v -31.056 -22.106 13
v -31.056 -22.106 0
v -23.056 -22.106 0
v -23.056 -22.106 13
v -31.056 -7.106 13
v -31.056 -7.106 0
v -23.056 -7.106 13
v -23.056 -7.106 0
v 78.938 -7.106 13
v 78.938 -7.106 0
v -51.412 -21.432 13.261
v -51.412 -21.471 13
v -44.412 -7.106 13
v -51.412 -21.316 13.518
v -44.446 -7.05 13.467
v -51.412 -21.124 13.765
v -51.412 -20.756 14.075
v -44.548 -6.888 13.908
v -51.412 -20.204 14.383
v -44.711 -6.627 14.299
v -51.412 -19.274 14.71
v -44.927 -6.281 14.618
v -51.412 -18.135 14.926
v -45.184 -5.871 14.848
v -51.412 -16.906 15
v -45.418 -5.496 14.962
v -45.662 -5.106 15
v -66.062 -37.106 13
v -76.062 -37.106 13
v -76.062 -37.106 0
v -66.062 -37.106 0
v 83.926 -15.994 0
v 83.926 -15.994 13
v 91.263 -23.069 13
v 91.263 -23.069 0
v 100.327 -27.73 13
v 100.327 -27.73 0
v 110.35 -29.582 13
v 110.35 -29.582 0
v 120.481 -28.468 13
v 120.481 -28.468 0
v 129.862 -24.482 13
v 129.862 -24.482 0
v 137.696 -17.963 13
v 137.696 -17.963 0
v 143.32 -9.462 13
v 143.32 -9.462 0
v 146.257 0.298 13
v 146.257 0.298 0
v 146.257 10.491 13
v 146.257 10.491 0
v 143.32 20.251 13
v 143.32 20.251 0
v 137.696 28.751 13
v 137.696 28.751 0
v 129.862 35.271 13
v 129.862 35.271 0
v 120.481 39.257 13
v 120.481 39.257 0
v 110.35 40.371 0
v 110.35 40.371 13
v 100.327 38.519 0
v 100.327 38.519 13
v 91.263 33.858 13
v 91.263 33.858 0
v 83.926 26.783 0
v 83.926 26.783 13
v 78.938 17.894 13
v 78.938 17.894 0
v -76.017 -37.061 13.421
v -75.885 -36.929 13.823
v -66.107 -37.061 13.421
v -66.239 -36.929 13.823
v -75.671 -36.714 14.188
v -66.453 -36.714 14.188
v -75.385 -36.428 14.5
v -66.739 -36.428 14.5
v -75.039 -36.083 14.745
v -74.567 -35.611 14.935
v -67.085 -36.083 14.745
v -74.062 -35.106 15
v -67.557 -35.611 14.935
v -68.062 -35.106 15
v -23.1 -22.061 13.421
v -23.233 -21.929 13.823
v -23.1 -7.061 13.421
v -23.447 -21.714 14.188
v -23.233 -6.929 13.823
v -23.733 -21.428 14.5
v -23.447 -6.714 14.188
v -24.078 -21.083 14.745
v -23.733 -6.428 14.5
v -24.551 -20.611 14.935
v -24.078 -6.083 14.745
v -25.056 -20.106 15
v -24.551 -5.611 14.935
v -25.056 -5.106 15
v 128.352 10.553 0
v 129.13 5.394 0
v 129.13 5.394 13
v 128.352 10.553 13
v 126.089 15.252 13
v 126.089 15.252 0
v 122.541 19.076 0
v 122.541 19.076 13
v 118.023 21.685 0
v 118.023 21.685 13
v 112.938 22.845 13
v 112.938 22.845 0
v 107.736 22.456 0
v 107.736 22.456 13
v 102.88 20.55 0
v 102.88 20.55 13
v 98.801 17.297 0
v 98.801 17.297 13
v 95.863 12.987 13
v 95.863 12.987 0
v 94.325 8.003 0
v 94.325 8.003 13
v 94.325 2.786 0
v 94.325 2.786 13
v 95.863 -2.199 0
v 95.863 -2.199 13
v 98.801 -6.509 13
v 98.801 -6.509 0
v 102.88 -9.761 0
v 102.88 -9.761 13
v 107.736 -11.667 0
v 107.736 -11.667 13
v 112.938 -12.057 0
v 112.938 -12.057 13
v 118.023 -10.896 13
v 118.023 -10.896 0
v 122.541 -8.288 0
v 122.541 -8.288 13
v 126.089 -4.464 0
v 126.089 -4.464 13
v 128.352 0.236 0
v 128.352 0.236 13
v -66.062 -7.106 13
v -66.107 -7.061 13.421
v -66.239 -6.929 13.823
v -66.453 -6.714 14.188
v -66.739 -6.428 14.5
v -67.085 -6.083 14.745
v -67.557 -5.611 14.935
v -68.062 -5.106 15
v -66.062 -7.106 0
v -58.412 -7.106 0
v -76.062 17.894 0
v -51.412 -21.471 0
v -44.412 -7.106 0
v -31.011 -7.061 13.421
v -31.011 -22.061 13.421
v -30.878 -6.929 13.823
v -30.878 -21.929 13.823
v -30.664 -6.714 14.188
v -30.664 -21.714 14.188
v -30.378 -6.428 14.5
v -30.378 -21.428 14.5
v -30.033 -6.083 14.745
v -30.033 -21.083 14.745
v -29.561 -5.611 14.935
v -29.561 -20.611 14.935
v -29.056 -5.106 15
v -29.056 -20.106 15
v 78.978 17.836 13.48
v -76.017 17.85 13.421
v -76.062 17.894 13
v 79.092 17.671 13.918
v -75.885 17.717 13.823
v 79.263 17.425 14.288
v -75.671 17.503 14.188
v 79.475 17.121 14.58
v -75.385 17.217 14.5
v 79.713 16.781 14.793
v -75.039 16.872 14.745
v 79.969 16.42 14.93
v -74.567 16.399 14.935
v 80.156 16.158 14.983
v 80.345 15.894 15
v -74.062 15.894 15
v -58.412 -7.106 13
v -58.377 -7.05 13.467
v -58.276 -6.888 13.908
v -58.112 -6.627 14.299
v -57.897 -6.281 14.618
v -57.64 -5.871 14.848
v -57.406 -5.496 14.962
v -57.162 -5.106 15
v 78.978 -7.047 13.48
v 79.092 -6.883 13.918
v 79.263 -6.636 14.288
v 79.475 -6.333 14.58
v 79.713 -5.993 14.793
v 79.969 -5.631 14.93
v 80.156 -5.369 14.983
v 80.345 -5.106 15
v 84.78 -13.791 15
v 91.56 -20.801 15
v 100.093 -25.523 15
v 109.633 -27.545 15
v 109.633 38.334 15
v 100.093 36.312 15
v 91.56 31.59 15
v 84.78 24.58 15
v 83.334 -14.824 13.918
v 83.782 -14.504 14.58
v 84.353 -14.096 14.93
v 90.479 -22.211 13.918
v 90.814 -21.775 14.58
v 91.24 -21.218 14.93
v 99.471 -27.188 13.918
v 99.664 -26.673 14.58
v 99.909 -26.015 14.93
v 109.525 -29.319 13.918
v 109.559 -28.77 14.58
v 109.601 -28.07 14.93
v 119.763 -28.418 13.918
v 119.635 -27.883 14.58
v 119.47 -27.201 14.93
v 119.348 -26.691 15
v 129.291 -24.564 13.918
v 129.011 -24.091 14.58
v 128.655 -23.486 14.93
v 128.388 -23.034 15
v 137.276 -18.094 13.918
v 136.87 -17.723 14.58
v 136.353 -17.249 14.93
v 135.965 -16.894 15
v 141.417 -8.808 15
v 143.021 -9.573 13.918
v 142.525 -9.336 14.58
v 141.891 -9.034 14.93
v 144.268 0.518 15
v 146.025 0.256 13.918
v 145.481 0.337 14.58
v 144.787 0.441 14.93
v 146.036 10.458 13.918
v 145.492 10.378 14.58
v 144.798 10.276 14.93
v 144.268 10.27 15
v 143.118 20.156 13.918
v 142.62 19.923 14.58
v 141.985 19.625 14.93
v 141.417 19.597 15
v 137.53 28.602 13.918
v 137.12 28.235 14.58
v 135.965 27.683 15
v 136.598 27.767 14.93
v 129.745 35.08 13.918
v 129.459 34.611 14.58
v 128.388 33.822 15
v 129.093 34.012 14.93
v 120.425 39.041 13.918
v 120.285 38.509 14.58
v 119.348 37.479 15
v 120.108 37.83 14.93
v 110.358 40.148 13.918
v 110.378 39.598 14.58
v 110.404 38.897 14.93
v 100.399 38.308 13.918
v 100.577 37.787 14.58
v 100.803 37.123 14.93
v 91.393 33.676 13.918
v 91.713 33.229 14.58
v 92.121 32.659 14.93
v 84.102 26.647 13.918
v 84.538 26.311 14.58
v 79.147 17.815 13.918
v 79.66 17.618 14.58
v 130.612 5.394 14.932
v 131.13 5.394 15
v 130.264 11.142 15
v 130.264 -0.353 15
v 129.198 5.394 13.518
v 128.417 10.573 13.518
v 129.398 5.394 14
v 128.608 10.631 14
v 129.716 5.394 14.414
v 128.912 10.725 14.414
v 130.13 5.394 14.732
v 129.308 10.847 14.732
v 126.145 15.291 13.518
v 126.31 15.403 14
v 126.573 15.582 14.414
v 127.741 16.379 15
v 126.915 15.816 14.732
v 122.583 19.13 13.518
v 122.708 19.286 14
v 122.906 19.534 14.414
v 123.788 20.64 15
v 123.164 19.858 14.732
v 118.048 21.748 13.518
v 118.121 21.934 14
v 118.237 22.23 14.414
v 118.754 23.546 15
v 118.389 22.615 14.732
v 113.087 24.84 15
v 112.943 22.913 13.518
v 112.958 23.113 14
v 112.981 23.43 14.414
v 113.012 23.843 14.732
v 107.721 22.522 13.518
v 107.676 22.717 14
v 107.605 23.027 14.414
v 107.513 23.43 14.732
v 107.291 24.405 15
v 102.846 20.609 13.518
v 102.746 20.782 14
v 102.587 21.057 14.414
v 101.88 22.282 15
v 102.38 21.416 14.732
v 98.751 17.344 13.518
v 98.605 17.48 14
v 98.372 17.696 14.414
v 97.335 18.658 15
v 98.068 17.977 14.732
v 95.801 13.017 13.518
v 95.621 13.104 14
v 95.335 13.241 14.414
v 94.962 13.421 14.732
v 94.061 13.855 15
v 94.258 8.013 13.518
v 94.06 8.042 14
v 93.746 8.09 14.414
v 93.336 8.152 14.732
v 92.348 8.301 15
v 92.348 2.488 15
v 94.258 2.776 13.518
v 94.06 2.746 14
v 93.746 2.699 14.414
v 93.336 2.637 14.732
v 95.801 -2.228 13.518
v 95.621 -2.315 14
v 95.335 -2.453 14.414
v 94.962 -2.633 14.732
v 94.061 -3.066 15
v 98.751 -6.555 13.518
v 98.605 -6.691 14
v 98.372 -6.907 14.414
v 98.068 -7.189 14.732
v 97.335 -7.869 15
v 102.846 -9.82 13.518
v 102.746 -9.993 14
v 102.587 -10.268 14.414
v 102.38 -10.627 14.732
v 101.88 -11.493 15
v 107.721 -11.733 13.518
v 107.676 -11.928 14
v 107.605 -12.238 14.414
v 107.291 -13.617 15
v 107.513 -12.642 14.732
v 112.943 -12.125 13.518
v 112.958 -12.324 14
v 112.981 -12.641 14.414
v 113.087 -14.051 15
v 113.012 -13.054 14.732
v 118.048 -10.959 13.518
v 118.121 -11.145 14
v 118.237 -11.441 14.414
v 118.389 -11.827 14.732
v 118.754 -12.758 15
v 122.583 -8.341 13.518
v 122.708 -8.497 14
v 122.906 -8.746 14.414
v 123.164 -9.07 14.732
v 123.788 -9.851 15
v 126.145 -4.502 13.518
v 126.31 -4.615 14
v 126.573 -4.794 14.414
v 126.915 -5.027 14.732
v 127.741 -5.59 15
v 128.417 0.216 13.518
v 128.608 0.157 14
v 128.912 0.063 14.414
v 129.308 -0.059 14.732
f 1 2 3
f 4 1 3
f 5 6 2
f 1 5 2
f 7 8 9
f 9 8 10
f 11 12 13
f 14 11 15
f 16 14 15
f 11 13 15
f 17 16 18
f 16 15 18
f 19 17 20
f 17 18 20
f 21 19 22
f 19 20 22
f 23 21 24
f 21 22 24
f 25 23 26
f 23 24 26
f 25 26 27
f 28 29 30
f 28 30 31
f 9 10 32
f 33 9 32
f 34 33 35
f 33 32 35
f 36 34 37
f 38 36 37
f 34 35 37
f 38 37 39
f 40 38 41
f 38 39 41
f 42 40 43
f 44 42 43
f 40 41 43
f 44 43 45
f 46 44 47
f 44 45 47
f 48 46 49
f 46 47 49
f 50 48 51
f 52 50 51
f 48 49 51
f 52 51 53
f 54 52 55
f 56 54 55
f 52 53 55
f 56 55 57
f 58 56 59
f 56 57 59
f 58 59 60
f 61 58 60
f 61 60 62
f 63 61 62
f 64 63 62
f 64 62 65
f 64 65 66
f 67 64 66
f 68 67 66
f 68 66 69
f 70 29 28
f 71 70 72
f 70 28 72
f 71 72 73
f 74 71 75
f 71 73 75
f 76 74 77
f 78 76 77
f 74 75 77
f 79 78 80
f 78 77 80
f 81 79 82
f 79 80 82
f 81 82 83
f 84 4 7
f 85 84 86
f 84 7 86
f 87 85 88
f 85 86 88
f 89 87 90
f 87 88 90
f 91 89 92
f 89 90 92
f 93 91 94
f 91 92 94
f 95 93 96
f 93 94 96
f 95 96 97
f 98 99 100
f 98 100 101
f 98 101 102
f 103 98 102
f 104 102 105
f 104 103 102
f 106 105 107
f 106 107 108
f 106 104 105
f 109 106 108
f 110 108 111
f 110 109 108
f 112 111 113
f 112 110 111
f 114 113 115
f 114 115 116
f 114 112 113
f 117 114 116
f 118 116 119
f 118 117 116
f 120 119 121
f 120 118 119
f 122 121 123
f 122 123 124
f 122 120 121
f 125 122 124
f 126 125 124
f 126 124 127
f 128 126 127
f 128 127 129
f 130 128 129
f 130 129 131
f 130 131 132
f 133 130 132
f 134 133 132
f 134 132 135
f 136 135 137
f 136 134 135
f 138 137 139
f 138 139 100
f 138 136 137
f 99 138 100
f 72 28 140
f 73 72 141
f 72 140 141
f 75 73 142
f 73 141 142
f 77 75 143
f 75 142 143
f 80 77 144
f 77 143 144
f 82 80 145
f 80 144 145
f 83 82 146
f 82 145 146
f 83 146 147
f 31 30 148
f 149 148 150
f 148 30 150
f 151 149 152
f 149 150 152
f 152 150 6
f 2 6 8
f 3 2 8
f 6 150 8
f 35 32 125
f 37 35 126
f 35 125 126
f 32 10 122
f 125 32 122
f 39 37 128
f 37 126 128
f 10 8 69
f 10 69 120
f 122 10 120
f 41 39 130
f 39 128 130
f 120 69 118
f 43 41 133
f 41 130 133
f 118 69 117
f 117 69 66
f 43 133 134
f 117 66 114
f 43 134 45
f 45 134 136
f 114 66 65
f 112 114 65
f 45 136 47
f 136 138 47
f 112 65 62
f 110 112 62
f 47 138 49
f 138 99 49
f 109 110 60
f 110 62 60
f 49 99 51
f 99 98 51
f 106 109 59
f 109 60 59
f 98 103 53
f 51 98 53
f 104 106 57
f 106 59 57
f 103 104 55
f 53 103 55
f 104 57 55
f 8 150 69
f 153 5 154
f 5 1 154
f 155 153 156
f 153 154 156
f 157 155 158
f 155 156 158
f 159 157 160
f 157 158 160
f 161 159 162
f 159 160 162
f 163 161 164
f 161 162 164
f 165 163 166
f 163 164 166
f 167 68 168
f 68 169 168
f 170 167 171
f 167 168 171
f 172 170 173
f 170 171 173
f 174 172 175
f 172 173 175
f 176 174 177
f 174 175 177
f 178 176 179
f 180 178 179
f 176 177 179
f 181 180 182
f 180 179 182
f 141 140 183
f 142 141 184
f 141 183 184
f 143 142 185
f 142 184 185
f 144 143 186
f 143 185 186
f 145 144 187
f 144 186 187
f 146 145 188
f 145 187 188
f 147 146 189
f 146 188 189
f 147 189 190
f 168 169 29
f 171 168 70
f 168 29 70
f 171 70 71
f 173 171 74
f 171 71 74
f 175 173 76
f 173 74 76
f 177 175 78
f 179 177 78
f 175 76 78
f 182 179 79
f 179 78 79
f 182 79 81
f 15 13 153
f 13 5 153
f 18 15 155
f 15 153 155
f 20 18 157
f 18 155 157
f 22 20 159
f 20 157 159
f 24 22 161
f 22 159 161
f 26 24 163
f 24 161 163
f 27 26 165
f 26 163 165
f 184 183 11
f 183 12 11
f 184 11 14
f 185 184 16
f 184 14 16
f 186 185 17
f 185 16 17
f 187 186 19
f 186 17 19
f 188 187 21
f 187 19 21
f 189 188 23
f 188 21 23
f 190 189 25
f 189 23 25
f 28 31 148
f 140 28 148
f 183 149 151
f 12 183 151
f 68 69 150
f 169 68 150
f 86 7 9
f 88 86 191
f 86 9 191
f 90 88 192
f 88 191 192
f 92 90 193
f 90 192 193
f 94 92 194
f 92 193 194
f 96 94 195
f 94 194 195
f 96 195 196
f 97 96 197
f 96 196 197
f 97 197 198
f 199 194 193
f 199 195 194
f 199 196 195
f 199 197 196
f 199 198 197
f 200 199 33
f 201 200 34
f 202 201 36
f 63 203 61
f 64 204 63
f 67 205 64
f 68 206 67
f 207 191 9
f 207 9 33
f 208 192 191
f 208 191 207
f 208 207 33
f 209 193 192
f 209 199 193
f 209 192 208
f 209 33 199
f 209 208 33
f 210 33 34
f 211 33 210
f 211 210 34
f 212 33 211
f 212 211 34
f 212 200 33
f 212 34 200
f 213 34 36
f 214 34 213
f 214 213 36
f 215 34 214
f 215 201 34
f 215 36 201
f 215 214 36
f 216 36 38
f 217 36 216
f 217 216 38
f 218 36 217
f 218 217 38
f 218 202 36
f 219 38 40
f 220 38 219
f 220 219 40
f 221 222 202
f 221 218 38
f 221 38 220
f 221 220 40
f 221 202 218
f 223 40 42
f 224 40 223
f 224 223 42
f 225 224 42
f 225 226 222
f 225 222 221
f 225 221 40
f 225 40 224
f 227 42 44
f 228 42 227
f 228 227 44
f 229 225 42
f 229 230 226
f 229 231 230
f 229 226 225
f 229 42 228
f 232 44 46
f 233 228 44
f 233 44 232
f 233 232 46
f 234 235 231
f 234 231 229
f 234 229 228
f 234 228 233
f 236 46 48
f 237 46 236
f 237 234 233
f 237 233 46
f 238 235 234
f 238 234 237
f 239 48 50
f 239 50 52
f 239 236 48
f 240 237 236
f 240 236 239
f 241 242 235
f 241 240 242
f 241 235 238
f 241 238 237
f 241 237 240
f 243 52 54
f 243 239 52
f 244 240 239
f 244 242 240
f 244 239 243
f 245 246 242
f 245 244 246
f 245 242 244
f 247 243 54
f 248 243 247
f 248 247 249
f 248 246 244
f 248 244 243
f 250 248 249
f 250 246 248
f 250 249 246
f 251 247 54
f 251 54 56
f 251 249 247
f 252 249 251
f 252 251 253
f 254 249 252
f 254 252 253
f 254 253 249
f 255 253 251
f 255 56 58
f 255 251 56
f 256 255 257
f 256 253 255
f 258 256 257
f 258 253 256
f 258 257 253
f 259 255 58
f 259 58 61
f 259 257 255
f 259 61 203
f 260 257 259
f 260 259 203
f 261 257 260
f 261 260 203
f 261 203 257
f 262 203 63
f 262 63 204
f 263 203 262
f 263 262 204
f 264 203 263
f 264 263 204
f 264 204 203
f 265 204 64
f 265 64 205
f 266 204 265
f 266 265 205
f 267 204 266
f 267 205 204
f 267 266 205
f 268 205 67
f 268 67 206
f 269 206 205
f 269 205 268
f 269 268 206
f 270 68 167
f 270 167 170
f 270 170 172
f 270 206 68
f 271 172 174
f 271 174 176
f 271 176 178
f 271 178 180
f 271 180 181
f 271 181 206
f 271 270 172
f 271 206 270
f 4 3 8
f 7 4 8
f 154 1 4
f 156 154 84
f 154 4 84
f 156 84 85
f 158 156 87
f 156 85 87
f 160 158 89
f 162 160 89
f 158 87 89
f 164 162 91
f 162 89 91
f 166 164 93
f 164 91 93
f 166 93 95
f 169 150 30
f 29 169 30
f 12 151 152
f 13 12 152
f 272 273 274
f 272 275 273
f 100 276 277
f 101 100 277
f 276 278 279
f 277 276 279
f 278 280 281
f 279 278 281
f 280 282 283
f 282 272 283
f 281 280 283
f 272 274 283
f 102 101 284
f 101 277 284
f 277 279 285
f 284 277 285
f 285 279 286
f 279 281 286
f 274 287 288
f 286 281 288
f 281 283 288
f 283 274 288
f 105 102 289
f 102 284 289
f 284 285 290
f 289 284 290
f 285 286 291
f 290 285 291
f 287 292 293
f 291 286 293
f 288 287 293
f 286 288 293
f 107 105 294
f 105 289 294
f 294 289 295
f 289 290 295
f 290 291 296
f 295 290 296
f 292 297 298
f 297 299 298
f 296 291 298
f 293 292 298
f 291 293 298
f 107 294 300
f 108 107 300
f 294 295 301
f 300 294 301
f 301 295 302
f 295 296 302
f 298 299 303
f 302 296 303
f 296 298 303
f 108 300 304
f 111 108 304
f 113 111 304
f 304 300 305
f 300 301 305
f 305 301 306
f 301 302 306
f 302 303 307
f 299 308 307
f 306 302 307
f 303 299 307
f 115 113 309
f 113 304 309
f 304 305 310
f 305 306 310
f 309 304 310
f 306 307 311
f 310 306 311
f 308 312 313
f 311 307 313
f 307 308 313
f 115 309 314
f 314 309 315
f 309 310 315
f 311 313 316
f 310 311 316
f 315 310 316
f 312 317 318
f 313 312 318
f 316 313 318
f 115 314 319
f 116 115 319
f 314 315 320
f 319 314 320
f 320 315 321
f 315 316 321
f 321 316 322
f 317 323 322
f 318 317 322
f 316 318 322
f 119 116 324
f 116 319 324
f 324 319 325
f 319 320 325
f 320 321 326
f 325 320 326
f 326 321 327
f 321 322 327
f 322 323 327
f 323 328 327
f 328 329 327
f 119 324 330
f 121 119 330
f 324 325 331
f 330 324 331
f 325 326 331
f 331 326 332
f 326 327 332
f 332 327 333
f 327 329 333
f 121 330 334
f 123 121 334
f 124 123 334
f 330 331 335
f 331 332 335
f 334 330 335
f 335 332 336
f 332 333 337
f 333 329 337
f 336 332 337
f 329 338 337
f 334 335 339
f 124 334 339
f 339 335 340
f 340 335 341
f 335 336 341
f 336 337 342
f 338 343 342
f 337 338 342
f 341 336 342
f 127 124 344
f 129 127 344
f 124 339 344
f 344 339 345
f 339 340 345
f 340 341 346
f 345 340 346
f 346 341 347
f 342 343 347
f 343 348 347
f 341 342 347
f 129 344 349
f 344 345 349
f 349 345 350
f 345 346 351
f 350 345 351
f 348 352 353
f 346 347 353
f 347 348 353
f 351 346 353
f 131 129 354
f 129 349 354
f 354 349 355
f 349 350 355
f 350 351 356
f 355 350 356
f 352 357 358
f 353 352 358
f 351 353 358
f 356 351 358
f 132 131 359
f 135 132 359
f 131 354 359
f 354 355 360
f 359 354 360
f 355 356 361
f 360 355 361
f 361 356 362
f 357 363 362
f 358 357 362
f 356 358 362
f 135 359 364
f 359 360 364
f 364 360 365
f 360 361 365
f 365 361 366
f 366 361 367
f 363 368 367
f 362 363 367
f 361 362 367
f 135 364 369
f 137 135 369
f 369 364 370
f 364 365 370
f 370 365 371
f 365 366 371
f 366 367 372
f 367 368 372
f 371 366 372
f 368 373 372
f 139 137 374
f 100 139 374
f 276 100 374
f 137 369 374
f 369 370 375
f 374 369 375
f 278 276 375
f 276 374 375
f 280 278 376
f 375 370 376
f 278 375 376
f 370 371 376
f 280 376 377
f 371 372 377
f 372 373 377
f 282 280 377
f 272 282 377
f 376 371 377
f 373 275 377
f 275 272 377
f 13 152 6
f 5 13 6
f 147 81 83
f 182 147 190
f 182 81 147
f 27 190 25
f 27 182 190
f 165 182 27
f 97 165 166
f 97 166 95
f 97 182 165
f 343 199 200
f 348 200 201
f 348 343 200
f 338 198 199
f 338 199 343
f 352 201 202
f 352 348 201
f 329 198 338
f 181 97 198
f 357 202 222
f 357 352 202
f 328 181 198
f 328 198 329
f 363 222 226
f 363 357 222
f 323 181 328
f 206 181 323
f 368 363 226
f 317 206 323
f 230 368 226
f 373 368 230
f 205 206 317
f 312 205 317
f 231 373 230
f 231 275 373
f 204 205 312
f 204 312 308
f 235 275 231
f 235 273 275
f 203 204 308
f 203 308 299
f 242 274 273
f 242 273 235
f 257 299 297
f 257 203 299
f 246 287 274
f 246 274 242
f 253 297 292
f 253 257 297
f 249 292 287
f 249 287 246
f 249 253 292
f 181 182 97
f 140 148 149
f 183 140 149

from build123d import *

# Parameters (mm, degrees)
F0_R     = 17.5
F1_DEPTH = 15
F2_R     = 2


with BuildPart() as f1:
    # F0 (on Top) → F1 (new body)
    with BuildSketch(Plane.XY):
        with BuildLine():
            Line((78.938091, 17.894301), (-76.061909, 17.894301))
            Line((-76.061909, 17.894301), (-76.061909, -7.105699))
            Line((-76.061909, -7.105699), (-76.061909, -37.105699))
            Line((-76.061909, -37.105699), (-66.061909, -37.105699))
            Line((-66.061909, -37.105699), (-66.061909, -7.105699))
            Line((-66.061909, -7.105699), (-58.411911, -7.105699))
            Line((-58.411911, -7.105699), (-51.411911, -21.471429))
            Line((-51.411911, -21.471429), (-44.411911, -7.105699))
            Line((-44.411911, -7.105699), (-31.055583, -7.105699))
            Line((-31.055583, -7.105699), (-31.055583, -22.105699))
            Line((-31.055583, -22.105699), (-23.055583, -22.105699))
            Line((-23.055583, -22.105699), (-23.055583, -7.105699))
            Line((-23.055583, -7.105699), (78.938091, -7.105699))
            ThreePointArc((78.938091, -7.105699), (146.629833, 5.394301), (78.938091, 17.894301))
        make_face()
        with Locations((111.629833, 5.394301)):
            Circle(F0_R, mode=Mode.SUBTRACT)
    extrude(amount=F1_DEPTH)

    # F2
    f2_edges = [f1.edges().sort_by_distance(p)[0] for p in [
        (1.438091, 17.894301, 15),
        (-76.061909, -9.605699, 15),
        (-71.061909, -37.105699, 15),
        (-66.061909, -22.105699, 15),
        (-62.23691, -7.105699, 15),
        (-54.911911, -14.288564, 15),
        (-47.911911, -14.288564, 15),
        (-37.733747, -7.105699, 15),
        (-31.055583, -14.605699, 15),
        (-27.055583, -22.105699, 15),
        (-23.055583, -14.605699, 15),
        (27.941254, -7.105699, 15),
        (146.629833, 5.394301, 15),
        (94.129833, 5.394301, 15),
    ]]
    fillet(f2_edges, radius=F2_R)


solid = f1.part
